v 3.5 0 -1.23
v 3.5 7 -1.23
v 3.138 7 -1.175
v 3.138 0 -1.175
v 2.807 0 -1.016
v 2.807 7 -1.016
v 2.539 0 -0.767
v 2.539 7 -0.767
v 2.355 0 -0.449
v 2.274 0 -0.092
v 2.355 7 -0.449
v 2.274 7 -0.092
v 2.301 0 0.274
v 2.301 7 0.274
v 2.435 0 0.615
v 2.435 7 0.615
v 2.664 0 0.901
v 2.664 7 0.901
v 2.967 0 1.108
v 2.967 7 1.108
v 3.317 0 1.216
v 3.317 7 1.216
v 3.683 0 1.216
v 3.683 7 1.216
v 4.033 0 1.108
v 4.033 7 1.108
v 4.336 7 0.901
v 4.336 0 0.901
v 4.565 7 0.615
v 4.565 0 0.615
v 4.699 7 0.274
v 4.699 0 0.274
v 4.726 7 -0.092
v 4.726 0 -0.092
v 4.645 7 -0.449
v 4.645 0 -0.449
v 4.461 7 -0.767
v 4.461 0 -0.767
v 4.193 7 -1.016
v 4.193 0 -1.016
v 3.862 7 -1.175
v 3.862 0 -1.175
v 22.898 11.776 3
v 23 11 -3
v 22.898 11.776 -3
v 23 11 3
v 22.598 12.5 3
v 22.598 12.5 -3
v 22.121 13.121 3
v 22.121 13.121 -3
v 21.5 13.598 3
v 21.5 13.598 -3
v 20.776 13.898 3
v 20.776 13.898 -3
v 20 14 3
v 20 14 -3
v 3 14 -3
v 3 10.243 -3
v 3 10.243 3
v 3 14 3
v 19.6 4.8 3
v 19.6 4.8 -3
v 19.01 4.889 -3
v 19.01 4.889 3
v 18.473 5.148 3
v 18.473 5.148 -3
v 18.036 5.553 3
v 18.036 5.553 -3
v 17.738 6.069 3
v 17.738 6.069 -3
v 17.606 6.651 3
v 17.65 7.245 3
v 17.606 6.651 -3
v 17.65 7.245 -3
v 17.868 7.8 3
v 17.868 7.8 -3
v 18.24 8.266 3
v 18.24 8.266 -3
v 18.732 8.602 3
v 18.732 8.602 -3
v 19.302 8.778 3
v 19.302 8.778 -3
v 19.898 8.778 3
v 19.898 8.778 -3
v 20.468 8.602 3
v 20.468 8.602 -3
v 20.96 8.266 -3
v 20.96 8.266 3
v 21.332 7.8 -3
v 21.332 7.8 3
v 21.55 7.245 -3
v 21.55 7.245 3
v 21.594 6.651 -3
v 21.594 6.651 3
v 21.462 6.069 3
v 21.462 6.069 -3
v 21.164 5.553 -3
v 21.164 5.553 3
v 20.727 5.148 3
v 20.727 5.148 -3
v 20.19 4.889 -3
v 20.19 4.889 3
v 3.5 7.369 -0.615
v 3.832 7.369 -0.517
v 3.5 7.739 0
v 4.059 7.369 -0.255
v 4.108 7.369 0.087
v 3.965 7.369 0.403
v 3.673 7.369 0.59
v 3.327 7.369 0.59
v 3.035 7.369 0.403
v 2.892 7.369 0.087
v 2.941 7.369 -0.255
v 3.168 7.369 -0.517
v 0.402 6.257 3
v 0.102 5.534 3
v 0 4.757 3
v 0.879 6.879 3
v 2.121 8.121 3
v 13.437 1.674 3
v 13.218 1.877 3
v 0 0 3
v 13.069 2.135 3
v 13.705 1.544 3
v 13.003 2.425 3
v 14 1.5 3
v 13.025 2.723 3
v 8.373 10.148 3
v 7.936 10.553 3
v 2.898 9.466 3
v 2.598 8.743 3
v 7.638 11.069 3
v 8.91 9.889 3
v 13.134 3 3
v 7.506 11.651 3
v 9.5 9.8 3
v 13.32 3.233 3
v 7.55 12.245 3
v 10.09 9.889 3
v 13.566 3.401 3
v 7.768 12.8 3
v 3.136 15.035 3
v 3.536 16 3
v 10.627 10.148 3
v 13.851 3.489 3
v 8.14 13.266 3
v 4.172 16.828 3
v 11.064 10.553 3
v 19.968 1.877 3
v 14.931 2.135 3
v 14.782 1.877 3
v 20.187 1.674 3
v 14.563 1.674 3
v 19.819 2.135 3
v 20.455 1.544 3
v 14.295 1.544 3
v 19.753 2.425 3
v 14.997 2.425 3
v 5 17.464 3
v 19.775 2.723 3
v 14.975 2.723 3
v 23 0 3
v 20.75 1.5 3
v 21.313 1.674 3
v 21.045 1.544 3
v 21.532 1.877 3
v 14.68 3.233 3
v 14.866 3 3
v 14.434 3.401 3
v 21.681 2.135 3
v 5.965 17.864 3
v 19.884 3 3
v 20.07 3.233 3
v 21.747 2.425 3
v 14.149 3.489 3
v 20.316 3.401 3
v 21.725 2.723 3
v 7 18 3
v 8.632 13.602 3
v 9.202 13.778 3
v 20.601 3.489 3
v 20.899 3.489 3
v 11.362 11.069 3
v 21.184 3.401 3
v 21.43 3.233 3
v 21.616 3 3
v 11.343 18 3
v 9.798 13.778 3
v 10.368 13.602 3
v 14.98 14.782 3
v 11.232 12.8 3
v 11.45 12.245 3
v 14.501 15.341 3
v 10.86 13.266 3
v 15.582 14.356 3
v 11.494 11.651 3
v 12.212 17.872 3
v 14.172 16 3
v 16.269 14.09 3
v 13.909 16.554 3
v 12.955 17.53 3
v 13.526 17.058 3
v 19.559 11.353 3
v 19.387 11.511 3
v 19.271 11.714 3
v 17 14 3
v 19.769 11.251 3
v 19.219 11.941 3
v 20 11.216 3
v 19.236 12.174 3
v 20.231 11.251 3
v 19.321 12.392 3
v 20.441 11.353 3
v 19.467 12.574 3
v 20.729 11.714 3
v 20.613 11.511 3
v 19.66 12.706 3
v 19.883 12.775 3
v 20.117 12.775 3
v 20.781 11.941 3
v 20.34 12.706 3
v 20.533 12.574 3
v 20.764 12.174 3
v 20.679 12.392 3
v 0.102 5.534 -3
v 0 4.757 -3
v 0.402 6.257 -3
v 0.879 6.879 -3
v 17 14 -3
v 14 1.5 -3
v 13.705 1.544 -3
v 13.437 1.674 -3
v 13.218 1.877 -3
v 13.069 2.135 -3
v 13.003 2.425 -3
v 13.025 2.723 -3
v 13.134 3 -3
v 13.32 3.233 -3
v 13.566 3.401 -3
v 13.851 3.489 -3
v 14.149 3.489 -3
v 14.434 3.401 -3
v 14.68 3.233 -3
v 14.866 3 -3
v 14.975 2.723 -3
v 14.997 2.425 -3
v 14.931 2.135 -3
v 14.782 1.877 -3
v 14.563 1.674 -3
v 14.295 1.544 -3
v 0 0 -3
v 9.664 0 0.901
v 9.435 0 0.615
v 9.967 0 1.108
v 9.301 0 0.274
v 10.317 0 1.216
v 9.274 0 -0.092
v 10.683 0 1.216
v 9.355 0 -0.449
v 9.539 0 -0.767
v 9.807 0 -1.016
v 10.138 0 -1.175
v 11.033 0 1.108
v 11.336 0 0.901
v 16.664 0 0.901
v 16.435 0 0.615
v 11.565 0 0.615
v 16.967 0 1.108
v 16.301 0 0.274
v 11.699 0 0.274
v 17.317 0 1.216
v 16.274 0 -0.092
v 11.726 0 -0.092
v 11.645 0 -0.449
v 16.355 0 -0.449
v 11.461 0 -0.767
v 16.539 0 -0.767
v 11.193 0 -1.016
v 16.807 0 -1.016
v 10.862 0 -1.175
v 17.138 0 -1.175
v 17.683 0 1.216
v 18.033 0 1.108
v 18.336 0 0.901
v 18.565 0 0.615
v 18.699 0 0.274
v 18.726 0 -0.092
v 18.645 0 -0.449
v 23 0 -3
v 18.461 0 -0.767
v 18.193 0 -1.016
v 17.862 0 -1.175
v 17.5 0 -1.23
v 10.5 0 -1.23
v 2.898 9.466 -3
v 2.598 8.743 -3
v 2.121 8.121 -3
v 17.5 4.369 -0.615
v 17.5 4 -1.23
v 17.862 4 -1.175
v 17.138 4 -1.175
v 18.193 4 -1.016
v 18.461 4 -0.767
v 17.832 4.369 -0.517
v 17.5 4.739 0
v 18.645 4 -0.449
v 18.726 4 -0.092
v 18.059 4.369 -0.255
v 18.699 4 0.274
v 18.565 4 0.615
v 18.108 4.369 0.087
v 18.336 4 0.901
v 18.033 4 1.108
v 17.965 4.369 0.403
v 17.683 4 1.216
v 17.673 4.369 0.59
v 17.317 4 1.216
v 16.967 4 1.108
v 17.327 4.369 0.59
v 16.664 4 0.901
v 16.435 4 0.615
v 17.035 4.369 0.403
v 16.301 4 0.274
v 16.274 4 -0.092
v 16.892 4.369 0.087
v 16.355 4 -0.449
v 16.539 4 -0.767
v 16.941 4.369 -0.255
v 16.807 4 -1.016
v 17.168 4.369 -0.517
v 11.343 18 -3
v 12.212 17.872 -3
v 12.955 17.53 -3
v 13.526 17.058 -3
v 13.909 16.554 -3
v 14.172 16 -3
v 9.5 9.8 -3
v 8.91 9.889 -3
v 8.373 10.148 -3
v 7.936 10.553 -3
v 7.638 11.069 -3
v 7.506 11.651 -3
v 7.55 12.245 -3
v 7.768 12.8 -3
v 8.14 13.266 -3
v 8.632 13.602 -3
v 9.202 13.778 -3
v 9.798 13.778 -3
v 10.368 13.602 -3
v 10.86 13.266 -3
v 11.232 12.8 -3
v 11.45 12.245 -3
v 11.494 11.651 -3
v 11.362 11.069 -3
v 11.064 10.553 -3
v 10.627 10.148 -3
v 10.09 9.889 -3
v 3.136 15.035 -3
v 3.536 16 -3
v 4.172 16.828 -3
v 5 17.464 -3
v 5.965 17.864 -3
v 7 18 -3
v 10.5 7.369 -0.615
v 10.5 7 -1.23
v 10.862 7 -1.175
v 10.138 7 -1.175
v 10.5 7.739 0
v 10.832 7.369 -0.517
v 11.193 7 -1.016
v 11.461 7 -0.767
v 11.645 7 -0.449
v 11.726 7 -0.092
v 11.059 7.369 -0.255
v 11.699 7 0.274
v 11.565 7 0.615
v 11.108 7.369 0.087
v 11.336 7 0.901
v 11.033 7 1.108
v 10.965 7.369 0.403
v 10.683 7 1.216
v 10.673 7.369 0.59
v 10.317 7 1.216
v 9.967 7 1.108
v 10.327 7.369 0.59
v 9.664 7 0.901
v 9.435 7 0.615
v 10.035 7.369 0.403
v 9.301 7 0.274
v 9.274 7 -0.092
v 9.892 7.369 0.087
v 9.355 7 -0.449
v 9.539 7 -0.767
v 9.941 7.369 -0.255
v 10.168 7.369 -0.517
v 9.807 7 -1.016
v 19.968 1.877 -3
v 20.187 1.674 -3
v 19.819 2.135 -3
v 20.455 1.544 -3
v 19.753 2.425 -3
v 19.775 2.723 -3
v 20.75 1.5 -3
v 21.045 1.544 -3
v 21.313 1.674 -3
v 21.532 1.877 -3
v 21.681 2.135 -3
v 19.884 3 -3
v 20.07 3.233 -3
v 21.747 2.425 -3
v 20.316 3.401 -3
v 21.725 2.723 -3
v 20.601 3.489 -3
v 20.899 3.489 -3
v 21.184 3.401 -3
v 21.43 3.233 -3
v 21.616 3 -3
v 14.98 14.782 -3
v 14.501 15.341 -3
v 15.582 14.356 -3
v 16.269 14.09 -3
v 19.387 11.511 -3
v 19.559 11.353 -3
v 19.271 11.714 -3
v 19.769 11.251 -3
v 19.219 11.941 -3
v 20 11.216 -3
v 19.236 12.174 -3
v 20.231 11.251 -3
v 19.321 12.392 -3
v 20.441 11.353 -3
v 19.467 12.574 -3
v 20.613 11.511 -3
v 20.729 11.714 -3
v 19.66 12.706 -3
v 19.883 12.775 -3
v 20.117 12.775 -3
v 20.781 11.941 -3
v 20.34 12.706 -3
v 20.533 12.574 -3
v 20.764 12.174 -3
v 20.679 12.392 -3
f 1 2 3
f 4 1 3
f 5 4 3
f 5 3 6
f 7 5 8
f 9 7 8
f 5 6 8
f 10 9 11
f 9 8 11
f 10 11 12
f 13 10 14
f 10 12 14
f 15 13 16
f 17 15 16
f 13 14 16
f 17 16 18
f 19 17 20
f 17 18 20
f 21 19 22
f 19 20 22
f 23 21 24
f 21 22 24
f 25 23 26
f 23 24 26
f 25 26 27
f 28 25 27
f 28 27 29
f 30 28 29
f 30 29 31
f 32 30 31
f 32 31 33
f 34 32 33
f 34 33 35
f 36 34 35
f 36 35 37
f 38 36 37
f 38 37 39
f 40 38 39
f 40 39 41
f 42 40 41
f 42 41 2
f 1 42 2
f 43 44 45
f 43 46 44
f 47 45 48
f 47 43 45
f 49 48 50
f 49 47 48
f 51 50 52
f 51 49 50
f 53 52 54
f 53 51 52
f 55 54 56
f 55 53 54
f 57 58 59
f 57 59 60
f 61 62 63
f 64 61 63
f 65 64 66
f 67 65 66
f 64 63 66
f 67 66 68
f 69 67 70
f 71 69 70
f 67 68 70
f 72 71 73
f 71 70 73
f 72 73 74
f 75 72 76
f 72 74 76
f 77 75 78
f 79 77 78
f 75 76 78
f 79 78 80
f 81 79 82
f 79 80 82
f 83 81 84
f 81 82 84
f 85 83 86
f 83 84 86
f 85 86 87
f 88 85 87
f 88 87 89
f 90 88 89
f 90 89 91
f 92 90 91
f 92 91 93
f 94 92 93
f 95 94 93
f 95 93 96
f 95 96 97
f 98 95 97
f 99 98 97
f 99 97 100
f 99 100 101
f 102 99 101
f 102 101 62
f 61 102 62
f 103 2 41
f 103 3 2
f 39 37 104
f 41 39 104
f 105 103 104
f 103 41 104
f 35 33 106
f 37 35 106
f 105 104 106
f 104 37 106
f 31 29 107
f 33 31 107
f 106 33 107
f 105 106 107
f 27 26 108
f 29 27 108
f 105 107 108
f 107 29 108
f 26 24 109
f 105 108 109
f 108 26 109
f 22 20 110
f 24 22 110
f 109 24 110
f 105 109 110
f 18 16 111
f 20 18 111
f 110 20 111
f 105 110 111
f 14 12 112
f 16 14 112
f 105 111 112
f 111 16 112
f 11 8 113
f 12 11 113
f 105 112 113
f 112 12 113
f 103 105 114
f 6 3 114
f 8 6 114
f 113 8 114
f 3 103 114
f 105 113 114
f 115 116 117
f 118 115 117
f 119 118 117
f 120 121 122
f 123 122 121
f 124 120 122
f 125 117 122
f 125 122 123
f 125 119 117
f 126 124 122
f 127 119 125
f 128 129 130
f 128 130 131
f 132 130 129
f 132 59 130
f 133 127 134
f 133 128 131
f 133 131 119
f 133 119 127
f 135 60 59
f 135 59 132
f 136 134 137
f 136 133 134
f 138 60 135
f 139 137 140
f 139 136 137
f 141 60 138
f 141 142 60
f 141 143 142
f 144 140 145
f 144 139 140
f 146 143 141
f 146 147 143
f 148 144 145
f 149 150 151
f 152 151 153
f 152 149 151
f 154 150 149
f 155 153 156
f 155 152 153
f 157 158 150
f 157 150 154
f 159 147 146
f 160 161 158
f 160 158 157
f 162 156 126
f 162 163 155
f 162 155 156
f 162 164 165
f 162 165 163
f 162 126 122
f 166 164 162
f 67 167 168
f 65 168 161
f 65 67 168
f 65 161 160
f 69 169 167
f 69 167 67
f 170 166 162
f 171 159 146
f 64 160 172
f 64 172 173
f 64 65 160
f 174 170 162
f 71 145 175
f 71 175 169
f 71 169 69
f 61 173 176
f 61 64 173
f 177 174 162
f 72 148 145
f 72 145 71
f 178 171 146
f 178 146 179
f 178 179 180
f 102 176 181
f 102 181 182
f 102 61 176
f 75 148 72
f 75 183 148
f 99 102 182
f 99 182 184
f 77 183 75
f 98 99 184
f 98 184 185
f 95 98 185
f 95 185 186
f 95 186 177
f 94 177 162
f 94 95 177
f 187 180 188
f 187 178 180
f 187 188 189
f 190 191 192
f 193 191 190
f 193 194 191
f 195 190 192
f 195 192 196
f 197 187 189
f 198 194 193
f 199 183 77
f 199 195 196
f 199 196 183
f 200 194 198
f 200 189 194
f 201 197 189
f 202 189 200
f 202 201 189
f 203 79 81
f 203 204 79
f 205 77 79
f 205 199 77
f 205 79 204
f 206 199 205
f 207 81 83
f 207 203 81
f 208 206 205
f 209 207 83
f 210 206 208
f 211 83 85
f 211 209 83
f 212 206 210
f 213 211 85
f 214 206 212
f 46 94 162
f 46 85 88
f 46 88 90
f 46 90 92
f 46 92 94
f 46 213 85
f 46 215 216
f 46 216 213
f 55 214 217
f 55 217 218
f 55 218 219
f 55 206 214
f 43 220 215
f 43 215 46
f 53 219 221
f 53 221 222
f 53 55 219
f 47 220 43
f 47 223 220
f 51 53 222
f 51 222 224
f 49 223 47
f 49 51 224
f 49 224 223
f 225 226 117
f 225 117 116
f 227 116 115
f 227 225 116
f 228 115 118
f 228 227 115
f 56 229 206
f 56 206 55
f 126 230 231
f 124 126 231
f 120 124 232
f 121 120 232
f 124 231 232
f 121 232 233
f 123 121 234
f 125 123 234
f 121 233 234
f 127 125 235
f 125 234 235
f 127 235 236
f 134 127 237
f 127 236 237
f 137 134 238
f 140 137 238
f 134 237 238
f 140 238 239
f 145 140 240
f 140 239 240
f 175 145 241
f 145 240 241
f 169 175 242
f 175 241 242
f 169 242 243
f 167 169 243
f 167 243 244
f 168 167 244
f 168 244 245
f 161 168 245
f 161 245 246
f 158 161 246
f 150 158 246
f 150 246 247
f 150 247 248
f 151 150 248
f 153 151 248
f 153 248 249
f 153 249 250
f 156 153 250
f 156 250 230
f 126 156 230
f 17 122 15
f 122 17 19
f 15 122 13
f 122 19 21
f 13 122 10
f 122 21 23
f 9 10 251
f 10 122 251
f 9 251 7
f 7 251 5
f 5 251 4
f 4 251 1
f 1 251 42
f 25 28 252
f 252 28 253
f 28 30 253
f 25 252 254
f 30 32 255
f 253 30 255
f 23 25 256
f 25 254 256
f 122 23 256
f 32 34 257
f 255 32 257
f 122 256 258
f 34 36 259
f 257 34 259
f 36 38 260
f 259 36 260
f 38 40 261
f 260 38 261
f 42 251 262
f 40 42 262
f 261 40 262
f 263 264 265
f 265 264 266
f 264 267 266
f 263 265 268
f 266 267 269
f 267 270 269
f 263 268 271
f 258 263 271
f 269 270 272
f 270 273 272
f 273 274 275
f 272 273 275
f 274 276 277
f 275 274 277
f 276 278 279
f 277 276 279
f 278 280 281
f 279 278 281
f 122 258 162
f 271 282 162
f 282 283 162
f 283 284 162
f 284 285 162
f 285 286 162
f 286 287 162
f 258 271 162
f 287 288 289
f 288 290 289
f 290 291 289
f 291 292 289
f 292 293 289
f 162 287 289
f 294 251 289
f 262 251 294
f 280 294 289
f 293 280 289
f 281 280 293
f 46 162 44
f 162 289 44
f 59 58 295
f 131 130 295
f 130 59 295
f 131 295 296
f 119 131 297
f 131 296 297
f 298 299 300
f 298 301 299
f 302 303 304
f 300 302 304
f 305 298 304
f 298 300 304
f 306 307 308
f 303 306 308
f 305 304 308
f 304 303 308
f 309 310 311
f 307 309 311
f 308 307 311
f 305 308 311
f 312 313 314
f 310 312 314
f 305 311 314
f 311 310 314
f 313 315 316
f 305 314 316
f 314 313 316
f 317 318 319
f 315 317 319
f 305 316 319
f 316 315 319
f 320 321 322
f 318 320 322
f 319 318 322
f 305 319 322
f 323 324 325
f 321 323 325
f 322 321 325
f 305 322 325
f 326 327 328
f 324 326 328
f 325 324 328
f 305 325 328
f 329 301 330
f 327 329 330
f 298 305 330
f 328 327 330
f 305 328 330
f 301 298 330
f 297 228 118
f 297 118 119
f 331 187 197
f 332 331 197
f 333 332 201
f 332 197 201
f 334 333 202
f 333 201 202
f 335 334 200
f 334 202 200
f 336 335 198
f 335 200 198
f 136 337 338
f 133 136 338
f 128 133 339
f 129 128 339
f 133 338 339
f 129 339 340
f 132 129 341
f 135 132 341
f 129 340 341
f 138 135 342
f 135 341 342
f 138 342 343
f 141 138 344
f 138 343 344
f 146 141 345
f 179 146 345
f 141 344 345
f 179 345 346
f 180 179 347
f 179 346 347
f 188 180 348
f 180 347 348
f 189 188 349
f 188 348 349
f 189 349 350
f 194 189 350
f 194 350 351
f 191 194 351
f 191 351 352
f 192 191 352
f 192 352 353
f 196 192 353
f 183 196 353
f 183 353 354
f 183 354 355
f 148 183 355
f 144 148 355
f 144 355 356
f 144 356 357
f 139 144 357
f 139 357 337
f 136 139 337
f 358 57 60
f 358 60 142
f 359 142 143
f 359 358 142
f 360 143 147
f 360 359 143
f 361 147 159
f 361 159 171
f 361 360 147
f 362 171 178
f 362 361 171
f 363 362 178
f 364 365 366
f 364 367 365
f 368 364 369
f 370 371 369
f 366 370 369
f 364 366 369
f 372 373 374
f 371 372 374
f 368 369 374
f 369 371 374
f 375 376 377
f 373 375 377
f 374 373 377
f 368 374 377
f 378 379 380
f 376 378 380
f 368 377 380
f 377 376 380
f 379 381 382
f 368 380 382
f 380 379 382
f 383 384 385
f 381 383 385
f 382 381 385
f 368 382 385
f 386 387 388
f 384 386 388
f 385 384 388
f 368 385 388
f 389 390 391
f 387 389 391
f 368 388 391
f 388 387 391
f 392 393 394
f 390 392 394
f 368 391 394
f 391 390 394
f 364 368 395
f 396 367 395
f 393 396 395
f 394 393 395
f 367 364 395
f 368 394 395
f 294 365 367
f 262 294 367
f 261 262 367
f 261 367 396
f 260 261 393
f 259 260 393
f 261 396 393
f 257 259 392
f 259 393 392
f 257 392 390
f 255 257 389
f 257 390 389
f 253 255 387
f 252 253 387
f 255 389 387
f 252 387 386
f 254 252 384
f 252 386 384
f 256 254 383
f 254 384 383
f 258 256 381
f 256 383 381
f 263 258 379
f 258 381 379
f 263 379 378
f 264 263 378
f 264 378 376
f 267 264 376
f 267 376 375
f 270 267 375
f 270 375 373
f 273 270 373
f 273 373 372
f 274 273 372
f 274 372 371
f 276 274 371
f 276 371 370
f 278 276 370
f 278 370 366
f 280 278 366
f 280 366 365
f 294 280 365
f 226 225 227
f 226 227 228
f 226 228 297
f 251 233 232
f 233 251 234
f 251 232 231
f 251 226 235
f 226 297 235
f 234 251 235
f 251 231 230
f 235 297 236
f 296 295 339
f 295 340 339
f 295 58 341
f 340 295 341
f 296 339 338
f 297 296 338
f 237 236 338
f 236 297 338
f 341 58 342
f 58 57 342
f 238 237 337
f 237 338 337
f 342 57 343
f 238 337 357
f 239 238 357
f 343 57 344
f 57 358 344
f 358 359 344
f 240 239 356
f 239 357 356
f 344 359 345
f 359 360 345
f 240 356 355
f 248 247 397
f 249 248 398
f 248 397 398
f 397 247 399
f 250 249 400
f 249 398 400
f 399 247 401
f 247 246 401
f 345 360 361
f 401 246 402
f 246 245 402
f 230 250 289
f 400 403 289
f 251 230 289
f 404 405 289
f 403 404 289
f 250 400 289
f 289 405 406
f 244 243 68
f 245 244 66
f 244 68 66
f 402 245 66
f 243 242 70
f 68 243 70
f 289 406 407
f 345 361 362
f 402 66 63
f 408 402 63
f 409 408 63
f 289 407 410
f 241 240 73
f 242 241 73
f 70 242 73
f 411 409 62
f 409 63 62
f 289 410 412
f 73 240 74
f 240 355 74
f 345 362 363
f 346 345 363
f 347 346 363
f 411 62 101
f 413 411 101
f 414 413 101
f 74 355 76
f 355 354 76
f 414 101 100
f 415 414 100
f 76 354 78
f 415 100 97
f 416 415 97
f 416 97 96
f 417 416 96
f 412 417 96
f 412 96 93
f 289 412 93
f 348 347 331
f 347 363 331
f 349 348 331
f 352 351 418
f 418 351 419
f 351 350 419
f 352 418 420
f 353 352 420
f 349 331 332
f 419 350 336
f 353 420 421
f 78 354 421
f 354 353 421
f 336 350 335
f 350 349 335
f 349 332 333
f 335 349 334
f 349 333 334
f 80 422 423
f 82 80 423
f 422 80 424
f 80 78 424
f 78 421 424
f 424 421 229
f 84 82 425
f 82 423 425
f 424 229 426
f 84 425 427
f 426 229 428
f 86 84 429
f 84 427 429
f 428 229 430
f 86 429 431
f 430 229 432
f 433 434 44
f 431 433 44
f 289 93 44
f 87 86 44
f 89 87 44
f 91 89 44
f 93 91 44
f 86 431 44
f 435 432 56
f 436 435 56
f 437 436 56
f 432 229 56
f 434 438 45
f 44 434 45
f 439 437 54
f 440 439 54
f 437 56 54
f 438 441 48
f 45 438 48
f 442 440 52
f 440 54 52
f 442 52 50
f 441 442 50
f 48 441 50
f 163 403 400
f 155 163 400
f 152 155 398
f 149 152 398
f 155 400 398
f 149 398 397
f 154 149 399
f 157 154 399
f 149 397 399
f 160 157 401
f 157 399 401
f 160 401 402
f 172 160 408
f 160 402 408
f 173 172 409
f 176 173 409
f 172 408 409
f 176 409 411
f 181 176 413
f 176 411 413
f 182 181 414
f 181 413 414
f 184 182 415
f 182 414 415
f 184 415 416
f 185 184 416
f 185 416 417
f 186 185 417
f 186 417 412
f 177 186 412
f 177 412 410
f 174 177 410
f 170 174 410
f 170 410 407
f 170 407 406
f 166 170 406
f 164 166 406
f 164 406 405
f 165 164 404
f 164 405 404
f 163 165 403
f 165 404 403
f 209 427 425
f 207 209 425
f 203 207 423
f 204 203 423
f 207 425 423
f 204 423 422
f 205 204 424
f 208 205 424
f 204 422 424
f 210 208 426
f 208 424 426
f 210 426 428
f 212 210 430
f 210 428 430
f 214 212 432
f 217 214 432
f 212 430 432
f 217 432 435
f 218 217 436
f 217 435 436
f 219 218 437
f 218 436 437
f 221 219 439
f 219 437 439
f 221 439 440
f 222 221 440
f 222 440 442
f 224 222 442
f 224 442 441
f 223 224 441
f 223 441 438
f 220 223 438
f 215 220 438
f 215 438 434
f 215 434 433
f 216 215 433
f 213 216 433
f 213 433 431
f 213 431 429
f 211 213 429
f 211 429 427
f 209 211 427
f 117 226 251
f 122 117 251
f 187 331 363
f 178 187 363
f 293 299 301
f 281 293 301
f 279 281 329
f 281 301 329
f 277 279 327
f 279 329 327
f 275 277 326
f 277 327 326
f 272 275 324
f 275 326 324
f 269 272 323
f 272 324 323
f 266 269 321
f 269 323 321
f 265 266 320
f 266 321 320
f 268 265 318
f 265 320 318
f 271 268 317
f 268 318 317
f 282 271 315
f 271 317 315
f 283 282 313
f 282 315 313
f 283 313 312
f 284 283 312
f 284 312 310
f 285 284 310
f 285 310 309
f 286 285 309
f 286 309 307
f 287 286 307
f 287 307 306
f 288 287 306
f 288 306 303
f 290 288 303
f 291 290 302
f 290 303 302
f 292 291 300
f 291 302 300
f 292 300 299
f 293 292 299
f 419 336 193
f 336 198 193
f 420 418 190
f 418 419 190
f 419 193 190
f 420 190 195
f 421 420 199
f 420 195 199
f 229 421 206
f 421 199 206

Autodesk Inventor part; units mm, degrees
ref_plane "YZ Plane" through (0, 0, 0) normal (1, 0, 0) x (0, 1, 0)
ref_plane "XZ Plane" through (0, 0, 0) normal (0, 1, 0) x (-1, 0, 0)
ref_plane "XY Plane" through (0, 0, 0) normal (0, 0, 1) x (1, 0, 0)
sketch "Skizze2" plane through (0, 0, 0) normal (0, 0, 1) x (1, 0, 0)
  line L0 (0, 0) -> (23, 0)
  line L1 (23, 0) -> (23, 18)
  line L2 (23, 18) -> (3, 18)
  line L3 (0, 6) -> (0, 0)
  line L4 (0, 0) -> (0, 6)
  line L5 (0, 6) -> (3, 6)
  line L6 (3, 6) -> (3, 18)
  line L7 (0, 6) -> (3, 9)
  line L8 (0, 0) -> (19.6, 0)
  line L9 (19.6, 0) -> (19.6, 6.8)
  line L10 (23, 0) -> (23, 12)
  line L11 (9.5, 0) -> (9.5, 11.8)
  line L12 (14, 14) -> (23, 14)
  line L13 (14, 14) -> (14, 18)
  dimension "d21" = 18
  dimension "d22" = 6
  dimension "d23" = 3
  dimension "d24" = 23
  dimension "d25" = 45
  dimension "d26" = 19.6
  dimension "d27" = 6.8
  dimension "d28" = 12
  dimension "d30" = 11.8
  dimension "d31" = 9.5
  dimension "d36" = 14
  dimension "d37" = 9
extrude "Extrusion1" add sketch "Skizze2" along normal mid plane 6 contours L3 L5 L6 L2 L13 L12 L1 L0 | L7 L6 L5
hole "Bohrung1" at (19.6, 6.8, 0) at (9.5, 11.8, 0) direction (0, 0, -1) diameter 4 end through all both
fillet "Rundung1" radius 3 4 edges at (0, 6, 0) (3, 9, 0) (23, 14, 0) (14, 14, 0)
fillet "Rundung2" radius 4 1 edges at (3, 18, 0)
fillet "Rundung3" radius 3 1 edges at (14, 18, 0)
sketch "Skizze3" plane through (0, 0, 3) normal (0, -1, 0) x (1, 0, 0)
  line L0 (0, -3) -> (3.5, -3) construction
  line L1 (3.5, -3) -> (10.5, -3) construction
  line L2 (10.5, -3) -> (17.5, -3) construction
  dimension "d50" = 3.5
  dimension "d51" = 7
  dimension "d52" = 7
hole "Bohrung2" at (3.5, 0, 0) at (10.5, 0, 0) direction (0, 1, 0) diameter 2.459 depth 7 tip angle 118 thread size "M3x0.5" class "6H" standard "ISO Metric profile"
hole "Bohrung3" at (17.5, 0, 0) direction (0, 1, 0) diameter 2.459 depth 4 tip angle 118 thread size "M3x0.5" class "6H" standard "ISO Metric profile"
sketch "Skizze4" plane through (0, 0, 3) normal (0, 0, 1) x (1, 0, 0)
  line L0 (14, 0) -> (14, 2.5)
  line L1 (20.75, 0) -> (20.75, 2.5)
  line L2 (0, 4.7574) -> (0, 0) projected
  line L3 (0, 0) -> (0, 4.7574)
  point P0 (23, 0)
  dimension "d71" = 2.5
  dimension "d72" = 2.5
  dimension "d89" = 14
  dimension "d90" = 6.75
hole "Bohrung4" at (14, 2.5, 3) at (20.75, 2.5, 3) direction (0, 0, -1) diameter 2 end through all
sketch "Skizze5" plane through (0, 0, 3) normal (0, 0, 1) x (1, 0, 0)
  line L0 (20, 0) -> (20, 12)
  line L1 (0, 4.7574) -> (0, 0) projected
  line L2 (0, 0) -> (0, 4.7574)
  dimension "d81" = 12
  dimension "d91" = 20
hole "Bohrung5" at (20, 12, 3) direction (0, 0, -1) diameter 1.567 depth 6 thread size "M2x0.4" class "6H" standard "ISO Metric profile"
properties part number "Lagerblock Dribbler"
